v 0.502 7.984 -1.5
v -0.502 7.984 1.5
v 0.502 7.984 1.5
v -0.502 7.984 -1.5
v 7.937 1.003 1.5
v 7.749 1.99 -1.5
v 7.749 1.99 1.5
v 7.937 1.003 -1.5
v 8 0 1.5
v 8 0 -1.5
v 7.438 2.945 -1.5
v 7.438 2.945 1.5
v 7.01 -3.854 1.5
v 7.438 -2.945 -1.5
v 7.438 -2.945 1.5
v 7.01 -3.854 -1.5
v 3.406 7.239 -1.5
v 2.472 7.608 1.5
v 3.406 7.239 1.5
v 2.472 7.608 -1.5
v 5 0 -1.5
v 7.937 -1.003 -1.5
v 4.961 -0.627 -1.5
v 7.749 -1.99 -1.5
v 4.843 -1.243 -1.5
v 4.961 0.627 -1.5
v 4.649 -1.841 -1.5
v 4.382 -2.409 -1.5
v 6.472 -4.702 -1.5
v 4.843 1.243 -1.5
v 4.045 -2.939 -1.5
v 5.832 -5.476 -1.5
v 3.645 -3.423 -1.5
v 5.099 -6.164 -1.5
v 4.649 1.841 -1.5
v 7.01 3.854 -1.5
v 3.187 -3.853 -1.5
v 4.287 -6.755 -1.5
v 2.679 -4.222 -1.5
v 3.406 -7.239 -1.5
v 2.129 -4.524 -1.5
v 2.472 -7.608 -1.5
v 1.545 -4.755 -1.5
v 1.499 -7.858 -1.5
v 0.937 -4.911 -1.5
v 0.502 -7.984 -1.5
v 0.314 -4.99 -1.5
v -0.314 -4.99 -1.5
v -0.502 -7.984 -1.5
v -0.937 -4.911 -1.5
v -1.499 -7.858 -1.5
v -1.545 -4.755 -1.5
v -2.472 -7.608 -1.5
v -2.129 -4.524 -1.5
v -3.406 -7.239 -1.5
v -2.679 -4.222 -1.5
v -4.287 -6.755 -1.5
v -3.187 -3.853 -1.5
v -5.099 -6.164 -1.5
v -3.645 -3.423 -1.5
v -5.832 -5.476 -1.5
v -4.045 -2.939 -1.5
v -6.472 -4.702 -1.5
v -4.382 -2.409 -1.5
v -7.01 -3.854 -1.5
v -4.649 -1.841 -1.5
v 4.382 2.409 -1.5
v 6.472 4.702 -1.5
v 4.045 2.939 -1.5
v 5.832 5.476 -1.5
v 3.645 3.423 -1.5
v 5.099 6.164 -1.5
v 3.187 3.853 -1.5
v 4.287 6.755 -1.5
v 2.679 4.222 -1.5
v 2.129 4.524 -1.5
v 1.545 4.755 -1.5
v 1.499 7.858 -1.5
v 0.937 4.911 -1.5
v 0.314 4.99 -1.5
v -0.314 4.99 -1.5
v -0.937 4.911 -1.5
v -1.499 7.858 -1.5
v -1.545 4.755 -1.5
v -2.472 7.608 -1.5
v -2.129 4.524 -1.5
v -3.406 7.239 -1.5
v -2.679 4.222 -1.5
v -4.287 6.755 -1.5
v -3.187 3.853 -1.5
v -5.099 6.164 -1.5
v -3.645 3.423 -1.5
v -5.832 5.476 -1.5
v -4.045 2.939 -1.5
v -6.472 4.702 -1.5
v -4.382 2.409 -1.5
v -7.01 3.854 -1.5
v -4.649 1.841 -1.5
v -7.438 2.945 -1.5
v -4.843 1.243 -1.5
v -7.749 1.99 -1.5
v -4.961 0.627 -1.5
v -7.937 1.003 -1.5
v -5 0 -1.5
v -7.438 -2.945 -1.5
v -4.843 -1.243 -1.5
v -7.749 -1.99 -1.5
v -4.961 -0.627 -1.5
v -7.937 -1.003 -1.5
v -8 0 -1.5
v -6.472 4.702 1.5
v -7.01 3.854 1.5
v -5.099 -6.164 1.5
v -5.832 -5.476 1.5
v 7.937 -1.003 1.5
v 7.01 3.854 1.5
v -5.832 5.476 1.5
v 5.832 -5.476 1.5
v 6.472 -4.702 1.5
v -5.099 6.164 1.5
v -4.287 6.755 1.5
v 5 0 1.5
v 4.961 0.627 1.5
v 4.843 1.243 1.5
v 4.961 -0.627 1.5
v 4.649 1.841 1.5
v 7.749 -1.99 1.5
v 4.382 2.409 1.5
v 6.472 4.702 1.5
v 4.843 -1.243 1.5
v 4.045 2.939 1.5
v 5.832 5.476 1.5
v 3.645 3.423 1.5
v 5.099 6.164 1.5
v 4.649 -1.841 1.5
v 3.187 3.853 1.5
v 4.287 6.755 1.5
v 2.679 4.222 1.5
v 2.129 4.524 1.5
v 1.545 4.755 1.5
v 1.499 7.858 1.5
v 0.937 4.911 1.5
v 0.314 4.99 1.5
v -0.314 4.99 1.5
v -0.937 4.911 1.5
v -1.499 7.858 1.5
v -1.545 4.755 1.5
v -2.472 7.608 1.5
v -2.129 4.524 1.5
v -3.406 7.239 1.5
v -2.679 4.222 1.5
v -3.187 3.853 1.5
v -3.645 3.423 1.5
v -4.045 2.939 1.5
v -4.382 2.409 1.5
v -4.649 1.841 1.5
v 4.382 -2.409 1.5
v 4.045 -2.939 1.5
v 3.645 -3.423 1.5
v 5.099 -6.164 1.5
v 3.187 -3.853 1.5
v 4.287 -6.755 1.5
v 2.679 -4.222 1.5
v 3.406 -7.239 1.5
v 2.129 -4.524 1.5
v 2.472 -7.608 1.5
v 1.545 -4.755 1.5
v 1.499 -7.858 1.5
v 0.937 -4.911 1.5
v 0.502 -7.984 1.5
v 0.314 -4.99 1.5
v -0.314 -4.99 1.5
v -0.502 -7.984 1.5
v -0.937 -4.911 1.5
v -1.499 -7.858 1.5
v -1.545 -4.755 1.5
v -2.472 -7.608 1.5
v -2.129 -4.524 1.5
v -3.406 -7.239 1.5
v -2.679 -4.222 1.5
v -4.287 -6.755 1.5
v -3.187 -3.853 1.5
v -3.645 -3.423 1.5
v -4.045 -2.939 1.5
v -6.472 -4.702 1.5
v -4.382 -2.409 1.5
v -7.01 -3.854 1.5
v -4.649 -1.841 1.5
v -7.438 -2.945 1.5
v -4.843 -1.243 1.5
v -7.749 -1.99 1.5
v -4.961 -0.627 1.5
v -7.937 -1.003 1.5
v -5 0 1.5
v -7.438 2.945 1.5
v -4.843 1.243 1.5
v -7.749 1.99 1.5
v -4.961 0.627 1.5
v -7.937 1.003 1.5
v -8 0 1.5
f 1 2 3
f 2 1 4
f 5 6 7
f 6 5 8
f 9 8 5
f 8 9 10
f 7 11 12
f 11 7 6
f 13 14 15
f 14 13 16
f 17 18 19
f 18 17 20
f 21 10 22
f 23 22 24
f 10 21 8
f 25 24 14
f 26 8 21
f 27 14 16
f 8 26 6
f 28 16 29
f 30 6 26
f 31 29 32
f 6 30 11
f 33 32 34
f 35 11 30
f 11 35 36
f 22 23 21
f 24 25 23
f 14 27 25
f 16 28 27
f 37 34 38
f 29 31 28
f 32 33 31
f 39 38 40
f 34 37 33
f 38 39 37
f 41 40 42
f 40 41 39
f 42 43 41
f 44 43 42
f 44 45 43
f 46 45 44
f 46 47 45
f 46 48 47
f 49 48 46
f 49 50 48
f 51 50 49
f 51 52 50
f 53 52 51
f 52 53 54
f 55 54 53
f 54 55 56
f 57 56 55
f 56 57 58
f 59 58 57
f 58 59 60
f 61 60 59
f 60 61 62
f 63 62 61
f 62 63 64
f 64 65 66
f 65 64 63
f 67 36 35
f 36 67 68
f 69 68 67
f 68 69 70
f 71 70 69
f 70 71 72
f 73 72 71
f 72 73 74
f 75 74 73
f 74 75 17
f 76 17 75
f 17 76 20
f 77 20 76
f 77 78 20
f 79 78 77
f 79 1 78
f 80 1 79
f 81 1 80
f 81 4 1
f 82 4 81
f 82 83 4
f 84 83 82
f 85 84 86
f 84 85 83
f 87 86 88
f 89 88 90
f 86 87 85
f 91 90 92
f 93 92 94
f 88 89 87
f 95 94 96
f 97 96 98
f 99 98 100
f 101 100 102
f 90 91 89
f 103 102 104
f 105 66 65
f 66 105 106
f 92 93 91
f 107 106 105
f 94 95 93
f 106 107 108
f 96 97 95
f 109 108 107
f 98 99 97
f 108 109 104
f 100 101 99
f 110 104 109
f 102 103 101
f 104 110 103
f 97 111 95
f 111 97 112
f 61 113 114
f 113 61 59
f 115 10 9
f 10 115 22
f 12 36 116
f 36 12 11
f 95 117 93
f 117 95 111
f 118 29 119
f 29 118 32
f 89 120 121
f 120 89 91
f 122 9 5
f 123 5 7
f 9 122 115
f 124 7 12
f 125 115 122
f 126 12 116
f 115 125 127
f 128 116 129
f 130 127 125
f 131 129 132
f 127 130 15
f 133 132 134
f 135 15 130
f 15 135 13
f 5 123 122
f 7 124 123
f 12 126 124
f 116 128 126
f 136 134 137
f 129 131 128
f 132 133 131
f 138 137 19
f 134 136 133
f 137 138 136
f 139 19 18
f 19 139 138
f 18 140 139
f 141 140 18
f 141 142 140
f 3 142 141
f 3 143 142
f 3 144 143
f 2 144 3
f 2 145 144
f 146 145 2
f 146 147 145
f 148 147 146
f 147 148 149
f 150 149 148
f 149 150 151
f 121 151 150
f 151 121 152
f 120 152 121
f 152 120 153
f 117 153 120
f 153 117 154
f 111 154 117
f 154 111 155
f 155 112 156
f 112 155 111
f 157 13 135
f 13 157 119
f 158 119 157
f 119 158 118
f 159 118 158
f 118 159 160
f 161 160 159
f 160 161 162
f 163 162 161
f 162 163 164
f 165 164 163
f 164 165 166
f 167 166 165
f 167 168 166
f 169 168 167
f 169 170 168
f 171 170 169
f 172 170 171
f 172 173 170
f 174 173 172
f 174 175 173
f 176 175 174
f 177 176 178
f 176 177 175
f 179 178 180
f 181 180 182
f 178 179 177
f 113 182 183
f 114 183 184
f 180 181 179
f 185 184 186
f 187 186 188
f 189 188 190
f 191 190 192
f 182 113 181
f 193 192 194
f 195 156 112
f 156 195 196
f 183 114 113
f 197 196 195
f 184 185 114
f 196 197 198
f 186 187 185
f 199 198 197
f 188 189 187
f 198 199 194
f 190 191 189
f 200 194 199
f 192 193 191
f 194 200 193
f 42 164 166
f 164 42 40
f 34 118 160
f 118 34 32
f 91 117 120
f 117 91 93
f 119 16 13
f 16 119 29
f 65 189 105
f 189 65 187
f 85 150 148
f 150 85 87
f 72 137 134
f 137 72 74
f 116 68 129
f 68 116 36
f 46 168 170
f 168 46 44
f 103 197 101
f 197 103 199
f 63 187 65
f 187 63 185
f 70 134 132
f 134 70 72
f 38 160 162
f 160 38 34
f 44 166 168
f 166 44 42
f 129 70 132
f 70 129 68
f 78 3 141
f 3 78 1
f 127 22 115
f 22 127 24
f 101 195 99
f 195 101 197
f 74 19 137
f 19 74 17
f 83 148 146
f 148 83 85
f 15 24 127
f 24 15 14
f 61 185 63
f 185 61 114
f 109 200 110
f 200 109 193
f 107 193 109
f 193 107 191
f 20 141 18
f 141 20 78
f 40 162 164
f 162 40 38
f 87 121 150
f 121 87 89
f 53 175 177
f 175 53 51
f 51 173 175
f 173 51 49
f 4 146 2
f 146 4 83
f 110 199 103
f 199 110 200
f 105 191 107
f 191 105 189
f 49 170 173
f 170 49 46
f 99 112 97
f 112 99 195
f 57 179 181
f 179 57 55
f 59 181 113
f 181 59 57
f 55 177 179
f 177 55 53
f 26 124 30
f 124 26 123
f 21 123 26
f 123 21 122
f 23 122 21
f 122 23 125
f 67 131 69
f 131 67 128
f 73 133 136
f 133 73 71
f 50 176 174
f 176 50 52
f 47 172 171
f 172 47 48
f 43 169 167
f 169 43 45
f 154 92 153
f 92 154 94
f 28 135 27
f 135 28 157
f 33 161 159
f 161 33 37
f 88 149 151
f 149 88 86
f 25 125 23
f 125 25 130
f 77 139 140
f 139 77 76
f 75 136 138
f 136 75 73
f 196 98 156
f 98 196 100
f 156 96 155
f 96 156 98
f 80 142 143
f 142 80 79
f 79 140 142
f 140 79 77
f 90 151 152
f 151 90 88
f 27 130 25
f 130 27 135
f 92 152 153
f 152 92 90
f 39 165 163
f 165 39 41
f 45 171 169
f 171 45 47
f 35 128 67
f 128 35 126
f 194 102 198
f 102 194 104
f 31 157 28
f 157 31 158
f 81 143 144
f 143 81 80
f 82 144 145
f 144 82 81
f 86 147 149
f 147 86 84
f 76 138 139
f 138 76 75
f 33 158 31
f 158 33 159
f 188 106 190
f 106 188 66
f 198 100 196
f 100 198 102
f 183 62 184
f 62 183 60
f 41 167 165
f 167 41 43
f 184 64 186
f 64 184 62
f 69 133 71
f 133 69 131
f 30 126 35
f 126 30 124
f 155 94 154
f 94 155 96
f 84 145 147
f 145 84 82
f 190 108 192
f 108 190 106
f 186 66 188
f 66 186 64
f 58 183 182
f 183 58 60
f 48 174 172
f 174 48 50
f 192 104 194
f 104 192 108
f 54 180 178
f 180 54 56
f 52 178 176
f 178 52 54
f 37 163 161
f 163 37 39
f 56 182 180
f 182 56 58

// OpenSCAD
$fn = 50;


difference() {
	union() {
		translate(v = [0, 0, -1.5000000000]) {
			cylinder(h = 3, r = 8.0000000000);
		}
	}
	union() {
		translate(v = [0, 0, -100.0000000000]) {
			cylinder(h = 200, r = 5.0000000000);
		}
	}
}
